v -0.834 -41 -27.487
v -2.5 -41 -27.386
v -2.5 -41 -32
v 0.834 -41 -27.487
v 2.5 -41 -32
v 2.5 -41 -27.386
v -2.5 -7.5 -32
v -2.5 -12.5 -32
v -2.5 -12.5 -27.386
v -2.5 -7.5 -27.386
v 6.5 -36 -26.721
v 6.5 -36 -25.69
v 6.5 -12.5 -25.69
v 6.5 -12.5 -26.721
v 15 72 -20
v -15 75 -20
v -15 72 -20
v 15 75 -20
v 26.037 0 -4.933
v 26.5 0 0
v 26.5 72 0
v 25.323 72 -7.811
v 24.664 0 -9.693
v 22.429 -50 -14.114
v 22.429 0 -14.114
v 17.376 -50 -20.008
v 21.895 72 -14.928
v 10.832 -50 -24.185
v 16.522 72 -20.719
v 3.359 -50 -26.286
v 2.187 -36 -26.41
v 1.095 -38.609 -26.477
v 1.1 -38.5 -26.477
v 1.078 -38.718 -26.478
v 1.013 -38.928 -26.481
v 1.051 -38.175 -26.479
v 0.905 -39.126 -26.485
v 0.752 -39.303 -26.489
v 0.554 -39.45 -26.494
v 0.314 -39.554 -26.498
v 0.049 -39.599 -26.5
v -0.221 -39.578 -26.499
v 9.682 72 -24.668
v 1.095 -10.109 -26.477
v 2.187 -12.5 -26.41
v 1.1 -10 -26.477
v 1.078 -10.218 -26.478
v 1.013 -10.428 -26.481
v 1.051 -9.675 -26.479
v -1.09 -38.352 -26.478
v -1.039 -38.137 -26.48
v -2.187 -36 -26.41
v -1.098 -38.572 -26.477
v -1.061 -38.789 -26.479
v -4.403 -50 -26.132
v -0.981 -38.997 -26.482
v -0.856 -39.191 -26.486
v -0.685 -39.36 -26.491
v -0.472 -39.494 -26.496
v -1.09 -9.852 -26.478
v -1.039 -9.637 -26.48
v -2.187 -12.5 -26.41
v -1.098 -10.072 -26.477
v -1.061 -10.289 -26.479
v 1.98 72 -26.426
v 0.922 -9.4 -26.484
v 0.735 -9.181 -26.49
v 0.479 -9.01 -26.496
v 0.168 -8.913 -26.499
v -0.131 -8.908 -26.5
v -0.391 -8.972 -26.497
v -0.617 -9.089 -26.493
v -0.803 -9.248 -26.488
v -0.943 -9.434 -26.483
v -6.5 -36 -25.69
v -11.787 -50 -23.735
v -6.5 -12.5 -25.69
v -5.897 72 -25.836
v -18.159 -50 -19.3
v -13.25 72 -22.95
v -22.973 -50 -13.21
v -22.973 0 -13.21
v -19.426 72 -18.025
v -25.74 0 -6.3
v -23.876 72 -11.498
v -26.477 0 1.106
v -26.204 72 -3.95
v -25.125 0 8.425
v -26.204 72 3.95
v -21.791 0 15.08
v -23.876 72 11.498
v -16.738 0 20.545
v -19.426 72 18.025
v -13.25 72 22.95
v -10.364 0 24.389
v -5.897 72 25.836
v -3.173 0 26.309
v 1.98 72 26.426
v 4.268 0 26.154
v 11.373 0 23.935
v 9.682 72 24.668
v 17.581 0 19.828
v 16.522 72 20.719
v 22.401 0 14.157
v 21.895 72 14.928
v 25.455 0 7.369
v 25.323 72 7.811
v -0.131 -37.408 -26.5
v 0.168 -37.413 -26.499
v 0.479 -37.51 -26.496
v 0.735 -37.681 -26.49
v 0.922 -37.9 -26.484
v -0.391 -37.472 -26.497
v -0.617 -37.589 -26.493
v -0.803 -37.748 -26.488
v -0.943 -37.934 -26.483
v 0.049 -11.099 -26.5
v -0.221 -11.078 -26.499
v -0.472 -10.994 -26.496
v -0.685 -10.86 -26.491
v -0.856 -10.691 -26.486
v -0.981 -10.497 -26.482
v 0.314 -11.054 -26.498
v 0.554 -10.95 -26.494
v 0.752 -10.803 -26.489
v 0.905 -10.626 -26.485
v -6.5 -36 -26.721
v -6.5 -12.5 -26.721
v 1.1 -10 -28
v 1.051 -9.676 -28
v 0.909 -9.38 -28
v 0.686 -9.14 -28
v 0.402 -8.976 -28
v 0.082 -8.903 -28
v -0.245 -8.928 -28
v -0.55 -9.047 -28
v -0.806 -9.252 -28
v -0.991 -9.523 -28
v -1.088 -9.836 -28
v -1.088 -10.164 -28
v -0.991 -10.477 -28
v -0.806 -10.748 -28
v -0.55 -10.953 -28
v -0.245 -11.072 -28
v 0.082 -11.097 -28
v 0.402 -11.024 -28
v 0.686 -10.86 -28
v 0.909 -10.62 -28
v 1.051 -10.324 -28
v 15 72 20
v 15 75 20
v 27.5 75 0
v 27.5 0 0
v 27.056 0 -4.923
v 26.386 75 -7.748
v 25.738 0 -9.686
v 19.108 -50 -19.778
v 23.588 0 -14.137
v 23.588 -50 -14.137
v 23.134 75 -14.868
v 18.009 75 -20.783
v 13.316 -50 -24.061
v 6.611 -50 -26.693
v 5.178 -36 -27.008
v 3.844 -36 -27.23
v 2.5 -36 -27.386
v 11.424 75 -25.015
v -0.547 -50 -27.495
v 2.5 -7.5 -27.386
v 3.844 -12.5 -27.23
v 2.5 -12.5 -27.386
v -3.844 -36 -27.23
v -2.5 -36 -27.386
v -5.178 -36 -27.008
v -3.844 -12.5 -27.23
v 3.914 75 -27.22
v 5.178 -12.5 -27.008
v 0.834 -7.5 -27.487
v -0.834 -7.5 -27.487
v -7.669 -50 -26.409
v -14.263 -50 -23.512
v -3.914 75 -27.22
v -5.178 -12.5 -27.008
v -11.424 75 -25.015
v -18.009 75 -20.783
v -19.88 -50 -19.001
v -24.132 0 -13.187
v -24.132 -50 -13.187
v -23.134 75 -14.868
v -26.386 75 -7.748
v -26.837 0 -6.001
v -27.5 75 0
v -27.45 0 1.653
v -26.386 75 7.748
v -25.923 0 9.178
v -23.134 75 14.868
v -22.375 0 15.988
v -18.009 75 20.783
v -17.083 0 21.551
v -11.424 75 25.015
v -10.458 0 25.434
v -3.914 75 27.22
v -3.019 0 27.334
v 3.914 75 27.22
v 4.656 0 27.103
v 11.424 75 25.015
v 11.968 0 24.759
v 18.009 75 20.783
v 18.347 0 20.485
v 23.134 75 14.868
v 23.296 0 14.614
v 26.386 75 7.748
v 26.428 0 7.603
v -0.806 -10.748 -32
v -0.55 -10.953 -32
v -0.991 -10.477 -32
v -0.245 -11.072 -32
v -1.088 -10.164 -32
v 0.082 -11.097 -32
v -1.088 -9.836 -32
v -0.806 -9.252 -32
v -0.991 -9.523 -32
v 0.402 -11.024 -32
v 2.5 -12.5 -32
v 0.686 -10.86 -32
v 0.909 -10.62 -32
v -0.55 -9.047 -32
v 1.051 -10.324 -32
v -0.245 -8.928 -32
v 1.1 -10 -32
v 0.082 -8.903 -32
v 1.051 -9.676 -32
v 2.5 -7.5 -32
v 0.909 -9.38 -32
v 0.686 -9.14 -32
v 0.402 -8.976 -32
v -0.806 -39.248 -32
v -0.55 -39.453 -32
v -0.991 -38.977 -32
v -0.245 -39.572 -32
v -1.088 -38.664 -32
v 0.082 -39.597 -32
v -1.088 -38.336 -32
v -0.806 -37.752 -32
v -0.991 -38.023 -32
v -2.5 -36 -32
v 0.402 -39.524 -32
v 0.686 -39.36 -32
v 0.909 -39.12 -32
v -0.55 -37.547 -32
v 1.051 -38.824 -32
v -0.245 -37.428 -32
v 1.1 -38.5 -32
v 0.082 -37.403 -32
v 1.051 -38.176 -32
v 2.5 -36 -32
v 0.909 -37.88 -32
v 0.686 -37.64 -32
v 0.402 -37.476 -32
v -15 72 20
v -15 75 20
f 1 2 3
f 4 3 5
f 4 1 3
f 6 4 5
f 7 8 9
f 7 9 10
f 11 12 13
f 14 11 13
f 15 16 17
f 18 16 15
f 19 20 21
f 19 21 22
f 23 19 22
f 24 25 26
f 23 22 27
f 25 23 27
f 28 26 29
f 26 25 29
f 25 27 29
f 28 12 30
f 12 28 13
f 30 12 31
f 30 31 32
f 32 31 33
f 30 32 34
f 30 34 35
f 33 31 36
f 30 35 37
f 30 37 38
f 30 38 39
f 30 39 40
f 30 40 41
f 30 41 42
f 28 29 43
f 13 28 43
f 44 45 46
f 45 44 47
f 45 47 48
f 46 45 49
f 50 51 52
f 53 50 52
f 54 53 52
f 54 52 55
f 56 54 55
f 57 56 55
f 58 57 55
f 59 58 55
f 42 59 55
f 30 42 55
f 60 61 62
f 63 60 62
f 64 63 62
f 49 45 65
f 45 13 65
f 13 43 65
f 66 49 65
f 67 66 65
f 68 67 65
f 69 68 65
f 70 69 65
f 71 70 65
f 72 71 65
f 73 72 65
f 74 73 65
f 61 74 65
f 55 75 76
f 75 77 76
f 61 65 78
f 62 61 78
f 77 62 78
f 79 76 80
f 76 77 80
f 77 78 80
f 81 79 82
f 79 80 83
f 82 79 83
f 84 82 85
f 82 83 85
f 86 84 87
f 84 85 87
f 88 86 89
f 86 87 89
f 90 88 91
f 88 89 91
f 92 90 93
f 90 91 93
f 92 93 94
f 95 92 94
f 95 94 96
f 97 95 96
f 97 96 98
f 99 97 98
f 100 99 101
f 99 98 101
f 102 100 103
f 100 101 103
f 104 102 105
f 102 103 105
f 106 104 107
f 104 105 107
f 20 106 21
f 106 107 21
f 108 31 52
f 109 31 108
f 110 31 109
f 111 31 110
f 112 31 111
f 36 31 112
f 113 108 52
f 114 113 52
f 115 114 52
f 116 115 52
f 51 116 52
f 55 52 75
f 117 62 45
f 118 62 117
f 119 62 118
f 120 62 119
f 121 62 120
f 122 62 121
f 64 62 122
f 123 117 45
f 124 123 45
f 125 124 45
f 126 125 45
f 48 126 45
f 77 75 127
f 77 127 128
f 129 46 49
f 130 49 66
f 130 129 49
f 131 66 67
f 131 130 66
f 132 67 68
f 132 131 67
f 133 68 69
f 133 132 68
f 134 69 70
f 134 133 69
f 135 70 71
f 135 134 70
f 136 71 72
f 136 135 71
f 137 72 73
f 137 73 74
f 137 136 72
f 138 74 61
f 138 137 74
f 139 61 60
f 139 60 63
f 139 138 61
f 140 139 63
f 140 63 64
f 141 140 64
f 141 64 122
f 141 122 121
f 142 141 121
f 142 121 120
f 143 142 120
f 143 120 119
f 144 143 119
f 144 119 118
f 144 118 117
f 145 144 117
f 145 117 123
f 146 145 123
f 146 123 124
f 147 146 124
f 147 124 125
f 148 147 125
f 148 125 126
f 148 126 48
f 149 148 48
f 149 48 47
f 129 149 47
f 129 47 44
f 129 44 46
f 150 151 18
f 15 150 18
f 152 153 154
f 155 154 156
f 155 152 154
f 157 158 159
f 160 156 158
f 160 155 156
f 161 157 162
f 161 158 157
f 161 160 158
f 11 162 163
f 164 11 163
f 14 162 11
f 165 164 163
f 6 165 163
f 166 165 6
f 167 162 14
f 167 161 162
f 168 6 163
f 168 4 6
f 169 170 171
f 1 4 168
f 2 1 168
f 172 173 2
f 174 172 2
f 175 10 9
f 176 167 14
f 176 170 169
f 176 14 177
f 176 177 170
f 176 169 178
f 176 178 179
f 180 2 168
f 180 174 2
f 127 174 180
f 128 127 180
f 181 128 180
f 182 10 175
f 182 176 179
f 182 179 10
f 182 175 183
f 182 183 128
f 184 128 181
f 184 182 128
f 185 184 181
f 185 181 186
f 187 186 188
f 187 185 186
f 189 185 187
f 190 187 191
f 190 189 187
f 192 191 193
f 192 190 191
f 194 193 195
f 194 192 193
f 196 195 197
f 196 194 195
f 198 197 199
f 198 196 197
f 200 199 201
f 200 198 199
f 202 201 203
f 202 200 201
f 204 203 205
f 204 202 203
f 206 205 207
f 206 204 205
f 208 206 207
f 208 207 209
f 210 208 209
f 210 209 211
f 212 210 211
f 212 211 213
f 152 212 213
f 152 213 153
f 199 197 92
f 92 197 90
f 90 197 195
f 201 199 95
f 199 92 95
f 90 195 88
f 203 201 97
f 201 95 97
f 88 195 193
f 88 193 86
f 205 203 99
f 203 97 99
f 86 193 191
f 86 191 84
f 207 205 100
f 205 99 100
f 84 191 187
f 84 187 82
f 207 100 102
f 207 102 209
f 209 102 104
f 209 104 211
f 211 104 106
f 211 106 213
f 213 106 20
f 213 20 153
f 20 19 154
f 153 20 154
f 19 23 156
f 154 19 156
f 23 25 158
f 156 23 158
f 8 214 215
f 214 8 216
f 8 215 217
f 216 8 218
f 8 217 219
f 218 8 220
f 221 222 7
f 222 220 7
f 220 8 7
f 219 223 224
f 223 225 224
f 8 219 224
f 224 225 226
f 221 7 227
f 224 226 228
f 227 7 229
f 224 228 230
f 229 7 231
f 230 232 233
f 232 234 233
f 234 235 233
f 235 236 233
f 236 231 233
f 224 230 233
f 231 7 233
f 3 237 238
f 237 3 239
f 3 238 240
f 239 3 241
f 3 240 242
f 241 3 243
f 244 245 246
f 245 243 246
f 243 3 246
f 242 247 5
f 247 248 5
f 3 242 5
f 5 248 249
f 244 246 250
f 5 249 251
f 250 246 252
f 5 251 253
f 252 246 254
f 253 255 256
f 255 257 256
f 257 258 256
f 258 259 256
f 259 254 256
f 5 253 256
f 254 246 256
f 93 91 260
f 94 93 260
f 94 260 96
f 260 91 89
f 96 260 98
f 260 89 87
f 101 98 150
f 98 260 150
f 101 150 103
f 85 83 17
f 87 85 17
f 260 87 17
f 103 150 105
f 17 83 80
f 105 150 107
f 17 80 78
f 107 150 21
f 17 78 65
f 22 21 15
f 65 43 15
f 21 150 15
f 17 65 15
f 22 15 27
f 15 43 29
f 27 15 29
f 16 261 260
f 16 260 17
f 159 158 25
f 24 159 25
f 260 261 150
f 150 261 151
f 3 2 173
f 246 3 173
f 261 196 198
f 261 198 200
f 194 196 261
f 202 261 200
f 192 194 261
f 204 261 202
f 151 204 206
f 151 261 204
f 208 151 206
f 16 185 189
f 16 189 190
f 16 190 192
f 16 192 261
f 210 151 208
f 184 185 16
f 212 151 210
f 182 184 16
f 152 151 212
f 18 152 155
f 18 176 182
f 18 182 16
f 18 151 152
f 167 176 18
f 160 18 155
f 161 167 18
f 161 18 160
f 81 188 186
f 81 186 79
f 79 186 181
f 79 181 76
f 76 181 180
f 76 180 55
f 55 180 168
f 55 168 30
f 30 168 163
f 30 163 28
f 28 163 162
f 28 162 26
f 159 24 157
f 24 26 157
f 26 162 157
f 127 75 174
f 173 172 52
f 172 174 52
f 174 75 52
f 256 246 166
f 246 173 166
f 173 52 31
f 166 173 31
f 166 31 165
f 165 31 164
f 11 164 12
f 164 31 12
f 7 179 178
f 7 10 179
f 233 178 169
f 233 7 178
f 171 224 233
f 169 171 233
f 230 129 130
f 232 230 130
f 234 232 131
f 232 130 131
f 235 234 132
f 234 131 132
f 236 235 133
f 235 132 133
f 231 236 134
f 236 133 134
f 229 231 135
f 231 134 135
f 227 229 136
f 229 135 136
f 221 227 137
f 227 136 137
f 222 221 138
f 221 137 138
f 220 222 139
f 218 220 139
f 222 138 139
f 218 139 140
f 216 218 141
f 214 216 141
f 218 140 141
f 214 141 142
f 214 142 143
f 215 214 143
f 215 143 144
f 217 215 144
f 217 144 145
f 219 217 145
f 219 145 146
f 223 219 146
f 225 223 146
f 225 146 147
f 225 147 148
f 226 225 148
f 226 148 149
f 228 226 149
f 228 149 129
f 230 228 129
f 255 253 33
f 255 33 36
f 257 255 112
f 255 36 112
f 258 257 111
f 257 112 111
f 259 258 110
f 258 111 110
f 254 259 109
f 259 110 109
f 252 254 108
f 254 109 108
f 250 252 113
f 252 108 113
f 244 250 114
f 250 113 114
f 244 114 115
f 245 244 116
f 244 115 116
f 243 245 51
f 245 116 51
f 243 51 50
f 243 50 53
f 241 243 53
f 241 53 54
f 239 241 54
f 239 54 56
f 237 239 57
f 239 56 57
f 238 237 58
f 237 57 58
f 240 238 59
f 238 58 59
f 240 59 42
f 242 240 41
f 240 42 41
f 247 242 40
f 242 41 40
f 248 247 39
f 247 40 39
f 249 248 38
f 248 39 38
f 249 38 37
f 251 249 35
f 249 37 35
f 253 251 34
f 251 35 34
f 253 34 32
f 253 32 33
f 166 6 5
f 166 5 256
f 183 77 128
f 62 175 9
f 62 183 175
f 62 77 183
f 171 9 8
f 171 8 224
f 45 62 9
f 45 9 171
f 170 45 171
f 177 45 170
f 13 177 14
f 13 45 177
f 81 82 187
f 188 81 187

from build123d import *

# Parameters (mm, degrees)
EXTRUDE_1_DEPTH           = 75
EXTRUDE_1_DEPTH_BACK      = 50
SKETCH_1_R                = 27.5
SKETCH_10_W               = 30
SKETCH_10_H               = 40
CUT_EXTRUDE_8_DEPTH       = 45.1
CUT_EXTRUDE_9_DEPTH       = 10
CUT_EXTRUDE_9_DEPTH_BACK  = 113
SKETCH_10_2_W             = 30
SKETCH_10_2_H             = 40
CUT_EXTRUDE_10_DEPTH      = 54
CUT_EXTRUDE_11_DEPTH      = 72
CUT_EXTRUDE_11_DEPTH_BACK = 55
SKETCH_12_R               = 26.5
SKETCH_13_W               = 13
SKETCH_13_H               = 23.5
CUT_EXTRUDE_12_DEPTH      = 54
EXTRUDE_2_DEPTH           = 1
EXTRUDE_2_DEPTH_BACK      = 4
SKETCH_14_W               = 5
SKETCH_14_H               = 5
CUT_EXTRUDE_13_DEPTH      = 4
CUT_EXTRUDE_13_DEPTH_BACK = 5
SKETCH_15_R               = 1.1


with BuildPart() as part:
    # 草圖1 → 填料-伸長1 (new, two sides: drawn at the far end of the back side and taken through both)
    with BuildSketch(Plane(origin=(0, 0, 0), x_dir=(1, 0, 0), z_dir=(0, 1, 0)).offset(-EXTRUDE_1_DEPTH_BACK)):
        Circle(SKETCH_1_R)
    extrude(amount=EXTRUDE_1_DEPTH + EXTRUDE_1_DEPTH_BACK)

    # 草圖10 → 除料-伸長8 (cut)
    with BuildSketch(Plane(origin=(0, 75, 0), x_dir=(1, 0, 0), z_dir=(0, 1, 0))):
        Rectangle(SKETCH_10_W, SKETCH_10_H)
    extrude(amount=-CUT_EXTRUDE_8_DEPTH, mode=Mode.SUBTRACT)

    # 草圖10<2> → 除料-伸長9 (cut, two sides: drawn at the far end of the back side and taken through both)
    with BuildSketch(Plane(origin=(0, 75, 0), x_dir=(1, 0, 0), z_dir=(0, 1, 0)).offset(-CUT_EXTRUDE_9_DEPTH_BACK)):
        Rectangle(SKETCH_10_2_W, SKETCH_10_2_H)
    extrude(amount=CUT_EXTRUDE_9_DEPTH + CUT_EXTRUDE_9_DEPTH_BACK, mode=Mode.SUBTRACT)

    # 草圖11 → 除料-伸長10 (cut)
    with BuildSketch(Plane(origin=(0, 0, 0), x_dir=(1, 0, 0), z_dir=(0, 1, 0))):
        with BuildLine():
            Line((23.587956714, 14.137124816), (-24.13203639, 13.186918505))
            ThreePointArc((-24.13203639, 13.186918505), (0.547474823, -27.494549848), (23.587956714, 14.137124816))
        make_face()
    extrude(amount=-CUT_EXTRUDE_10_DEPTH, mode=Mode.SUBTRACT)

    # 草圖12 → 除料-伸長11 (cut, two sides: drawn at the far end of the back side and taken through both)
    with BuildSketch(Plane(origin=(0, 0, 0), x_dir=(1, 0, 0), z_dir=(0, 1, 0)).offset(-CUT_EXTRUDE_11_DEPTH_BACK)):
        Circle(SKETCH_12_R)
    extrude(amount=CUT_EXTRUDE_11_DEPTH + CUT_EXTRUDE_11_DEPTH_BACK, mode=Mode.SUBTRACT)

    # 草圖13 → 除料-伸長12 (cut)
    with BuildSketch(Plane.XY):
        with Locations((0, -24.25)):
            Rectangle(SKETCH_13_W, SKETCH_13_H)
    extrude(amount=-CUT_EXTRUDE_12_DEPTH, mode=Mode.SUBTRACT)

    # 草圖14 → 填料-伸長2 (add, two sides: drawn at the far end of the back side and taken through both)
    with BuildSketch(Plane.XY.offset(-28).offset(-EXTRUDE_2_DEPTH_BACK)):
        with Locations((0, -38.5)):
            Rectangle(SKETCH_14_W, SKETCH_14_H)
        with Locations((0, -10)):
            Rectangle(SKETCH_14_W, SKETCH_14_H)
    extrude(amount=EXTRUDE_2_DEPTH + EXTRUDE_2_DEPTH_BACK)

    # 草圖15 → 除料-伸長13 (cut, two sides: drawn at the far end of the back side and taken through both)
    with BuildSketch(Plane.XY.offset(-28).offset(-CUT_EXTRUDE_13_DEPTH_BACK)):
        with Locations((0, -10)):
            Circle(SKETCH_15_R)
        with Locations((0, -38.5)):
            Circle(SKETCH_15_R)
    extrude(amount=CUT_EXTRUDE_13_DEPTH + CUT_EXTRUDE_13_DEPTH_BACK, mode=Mode.SUBTRACT)


solid = part.part
